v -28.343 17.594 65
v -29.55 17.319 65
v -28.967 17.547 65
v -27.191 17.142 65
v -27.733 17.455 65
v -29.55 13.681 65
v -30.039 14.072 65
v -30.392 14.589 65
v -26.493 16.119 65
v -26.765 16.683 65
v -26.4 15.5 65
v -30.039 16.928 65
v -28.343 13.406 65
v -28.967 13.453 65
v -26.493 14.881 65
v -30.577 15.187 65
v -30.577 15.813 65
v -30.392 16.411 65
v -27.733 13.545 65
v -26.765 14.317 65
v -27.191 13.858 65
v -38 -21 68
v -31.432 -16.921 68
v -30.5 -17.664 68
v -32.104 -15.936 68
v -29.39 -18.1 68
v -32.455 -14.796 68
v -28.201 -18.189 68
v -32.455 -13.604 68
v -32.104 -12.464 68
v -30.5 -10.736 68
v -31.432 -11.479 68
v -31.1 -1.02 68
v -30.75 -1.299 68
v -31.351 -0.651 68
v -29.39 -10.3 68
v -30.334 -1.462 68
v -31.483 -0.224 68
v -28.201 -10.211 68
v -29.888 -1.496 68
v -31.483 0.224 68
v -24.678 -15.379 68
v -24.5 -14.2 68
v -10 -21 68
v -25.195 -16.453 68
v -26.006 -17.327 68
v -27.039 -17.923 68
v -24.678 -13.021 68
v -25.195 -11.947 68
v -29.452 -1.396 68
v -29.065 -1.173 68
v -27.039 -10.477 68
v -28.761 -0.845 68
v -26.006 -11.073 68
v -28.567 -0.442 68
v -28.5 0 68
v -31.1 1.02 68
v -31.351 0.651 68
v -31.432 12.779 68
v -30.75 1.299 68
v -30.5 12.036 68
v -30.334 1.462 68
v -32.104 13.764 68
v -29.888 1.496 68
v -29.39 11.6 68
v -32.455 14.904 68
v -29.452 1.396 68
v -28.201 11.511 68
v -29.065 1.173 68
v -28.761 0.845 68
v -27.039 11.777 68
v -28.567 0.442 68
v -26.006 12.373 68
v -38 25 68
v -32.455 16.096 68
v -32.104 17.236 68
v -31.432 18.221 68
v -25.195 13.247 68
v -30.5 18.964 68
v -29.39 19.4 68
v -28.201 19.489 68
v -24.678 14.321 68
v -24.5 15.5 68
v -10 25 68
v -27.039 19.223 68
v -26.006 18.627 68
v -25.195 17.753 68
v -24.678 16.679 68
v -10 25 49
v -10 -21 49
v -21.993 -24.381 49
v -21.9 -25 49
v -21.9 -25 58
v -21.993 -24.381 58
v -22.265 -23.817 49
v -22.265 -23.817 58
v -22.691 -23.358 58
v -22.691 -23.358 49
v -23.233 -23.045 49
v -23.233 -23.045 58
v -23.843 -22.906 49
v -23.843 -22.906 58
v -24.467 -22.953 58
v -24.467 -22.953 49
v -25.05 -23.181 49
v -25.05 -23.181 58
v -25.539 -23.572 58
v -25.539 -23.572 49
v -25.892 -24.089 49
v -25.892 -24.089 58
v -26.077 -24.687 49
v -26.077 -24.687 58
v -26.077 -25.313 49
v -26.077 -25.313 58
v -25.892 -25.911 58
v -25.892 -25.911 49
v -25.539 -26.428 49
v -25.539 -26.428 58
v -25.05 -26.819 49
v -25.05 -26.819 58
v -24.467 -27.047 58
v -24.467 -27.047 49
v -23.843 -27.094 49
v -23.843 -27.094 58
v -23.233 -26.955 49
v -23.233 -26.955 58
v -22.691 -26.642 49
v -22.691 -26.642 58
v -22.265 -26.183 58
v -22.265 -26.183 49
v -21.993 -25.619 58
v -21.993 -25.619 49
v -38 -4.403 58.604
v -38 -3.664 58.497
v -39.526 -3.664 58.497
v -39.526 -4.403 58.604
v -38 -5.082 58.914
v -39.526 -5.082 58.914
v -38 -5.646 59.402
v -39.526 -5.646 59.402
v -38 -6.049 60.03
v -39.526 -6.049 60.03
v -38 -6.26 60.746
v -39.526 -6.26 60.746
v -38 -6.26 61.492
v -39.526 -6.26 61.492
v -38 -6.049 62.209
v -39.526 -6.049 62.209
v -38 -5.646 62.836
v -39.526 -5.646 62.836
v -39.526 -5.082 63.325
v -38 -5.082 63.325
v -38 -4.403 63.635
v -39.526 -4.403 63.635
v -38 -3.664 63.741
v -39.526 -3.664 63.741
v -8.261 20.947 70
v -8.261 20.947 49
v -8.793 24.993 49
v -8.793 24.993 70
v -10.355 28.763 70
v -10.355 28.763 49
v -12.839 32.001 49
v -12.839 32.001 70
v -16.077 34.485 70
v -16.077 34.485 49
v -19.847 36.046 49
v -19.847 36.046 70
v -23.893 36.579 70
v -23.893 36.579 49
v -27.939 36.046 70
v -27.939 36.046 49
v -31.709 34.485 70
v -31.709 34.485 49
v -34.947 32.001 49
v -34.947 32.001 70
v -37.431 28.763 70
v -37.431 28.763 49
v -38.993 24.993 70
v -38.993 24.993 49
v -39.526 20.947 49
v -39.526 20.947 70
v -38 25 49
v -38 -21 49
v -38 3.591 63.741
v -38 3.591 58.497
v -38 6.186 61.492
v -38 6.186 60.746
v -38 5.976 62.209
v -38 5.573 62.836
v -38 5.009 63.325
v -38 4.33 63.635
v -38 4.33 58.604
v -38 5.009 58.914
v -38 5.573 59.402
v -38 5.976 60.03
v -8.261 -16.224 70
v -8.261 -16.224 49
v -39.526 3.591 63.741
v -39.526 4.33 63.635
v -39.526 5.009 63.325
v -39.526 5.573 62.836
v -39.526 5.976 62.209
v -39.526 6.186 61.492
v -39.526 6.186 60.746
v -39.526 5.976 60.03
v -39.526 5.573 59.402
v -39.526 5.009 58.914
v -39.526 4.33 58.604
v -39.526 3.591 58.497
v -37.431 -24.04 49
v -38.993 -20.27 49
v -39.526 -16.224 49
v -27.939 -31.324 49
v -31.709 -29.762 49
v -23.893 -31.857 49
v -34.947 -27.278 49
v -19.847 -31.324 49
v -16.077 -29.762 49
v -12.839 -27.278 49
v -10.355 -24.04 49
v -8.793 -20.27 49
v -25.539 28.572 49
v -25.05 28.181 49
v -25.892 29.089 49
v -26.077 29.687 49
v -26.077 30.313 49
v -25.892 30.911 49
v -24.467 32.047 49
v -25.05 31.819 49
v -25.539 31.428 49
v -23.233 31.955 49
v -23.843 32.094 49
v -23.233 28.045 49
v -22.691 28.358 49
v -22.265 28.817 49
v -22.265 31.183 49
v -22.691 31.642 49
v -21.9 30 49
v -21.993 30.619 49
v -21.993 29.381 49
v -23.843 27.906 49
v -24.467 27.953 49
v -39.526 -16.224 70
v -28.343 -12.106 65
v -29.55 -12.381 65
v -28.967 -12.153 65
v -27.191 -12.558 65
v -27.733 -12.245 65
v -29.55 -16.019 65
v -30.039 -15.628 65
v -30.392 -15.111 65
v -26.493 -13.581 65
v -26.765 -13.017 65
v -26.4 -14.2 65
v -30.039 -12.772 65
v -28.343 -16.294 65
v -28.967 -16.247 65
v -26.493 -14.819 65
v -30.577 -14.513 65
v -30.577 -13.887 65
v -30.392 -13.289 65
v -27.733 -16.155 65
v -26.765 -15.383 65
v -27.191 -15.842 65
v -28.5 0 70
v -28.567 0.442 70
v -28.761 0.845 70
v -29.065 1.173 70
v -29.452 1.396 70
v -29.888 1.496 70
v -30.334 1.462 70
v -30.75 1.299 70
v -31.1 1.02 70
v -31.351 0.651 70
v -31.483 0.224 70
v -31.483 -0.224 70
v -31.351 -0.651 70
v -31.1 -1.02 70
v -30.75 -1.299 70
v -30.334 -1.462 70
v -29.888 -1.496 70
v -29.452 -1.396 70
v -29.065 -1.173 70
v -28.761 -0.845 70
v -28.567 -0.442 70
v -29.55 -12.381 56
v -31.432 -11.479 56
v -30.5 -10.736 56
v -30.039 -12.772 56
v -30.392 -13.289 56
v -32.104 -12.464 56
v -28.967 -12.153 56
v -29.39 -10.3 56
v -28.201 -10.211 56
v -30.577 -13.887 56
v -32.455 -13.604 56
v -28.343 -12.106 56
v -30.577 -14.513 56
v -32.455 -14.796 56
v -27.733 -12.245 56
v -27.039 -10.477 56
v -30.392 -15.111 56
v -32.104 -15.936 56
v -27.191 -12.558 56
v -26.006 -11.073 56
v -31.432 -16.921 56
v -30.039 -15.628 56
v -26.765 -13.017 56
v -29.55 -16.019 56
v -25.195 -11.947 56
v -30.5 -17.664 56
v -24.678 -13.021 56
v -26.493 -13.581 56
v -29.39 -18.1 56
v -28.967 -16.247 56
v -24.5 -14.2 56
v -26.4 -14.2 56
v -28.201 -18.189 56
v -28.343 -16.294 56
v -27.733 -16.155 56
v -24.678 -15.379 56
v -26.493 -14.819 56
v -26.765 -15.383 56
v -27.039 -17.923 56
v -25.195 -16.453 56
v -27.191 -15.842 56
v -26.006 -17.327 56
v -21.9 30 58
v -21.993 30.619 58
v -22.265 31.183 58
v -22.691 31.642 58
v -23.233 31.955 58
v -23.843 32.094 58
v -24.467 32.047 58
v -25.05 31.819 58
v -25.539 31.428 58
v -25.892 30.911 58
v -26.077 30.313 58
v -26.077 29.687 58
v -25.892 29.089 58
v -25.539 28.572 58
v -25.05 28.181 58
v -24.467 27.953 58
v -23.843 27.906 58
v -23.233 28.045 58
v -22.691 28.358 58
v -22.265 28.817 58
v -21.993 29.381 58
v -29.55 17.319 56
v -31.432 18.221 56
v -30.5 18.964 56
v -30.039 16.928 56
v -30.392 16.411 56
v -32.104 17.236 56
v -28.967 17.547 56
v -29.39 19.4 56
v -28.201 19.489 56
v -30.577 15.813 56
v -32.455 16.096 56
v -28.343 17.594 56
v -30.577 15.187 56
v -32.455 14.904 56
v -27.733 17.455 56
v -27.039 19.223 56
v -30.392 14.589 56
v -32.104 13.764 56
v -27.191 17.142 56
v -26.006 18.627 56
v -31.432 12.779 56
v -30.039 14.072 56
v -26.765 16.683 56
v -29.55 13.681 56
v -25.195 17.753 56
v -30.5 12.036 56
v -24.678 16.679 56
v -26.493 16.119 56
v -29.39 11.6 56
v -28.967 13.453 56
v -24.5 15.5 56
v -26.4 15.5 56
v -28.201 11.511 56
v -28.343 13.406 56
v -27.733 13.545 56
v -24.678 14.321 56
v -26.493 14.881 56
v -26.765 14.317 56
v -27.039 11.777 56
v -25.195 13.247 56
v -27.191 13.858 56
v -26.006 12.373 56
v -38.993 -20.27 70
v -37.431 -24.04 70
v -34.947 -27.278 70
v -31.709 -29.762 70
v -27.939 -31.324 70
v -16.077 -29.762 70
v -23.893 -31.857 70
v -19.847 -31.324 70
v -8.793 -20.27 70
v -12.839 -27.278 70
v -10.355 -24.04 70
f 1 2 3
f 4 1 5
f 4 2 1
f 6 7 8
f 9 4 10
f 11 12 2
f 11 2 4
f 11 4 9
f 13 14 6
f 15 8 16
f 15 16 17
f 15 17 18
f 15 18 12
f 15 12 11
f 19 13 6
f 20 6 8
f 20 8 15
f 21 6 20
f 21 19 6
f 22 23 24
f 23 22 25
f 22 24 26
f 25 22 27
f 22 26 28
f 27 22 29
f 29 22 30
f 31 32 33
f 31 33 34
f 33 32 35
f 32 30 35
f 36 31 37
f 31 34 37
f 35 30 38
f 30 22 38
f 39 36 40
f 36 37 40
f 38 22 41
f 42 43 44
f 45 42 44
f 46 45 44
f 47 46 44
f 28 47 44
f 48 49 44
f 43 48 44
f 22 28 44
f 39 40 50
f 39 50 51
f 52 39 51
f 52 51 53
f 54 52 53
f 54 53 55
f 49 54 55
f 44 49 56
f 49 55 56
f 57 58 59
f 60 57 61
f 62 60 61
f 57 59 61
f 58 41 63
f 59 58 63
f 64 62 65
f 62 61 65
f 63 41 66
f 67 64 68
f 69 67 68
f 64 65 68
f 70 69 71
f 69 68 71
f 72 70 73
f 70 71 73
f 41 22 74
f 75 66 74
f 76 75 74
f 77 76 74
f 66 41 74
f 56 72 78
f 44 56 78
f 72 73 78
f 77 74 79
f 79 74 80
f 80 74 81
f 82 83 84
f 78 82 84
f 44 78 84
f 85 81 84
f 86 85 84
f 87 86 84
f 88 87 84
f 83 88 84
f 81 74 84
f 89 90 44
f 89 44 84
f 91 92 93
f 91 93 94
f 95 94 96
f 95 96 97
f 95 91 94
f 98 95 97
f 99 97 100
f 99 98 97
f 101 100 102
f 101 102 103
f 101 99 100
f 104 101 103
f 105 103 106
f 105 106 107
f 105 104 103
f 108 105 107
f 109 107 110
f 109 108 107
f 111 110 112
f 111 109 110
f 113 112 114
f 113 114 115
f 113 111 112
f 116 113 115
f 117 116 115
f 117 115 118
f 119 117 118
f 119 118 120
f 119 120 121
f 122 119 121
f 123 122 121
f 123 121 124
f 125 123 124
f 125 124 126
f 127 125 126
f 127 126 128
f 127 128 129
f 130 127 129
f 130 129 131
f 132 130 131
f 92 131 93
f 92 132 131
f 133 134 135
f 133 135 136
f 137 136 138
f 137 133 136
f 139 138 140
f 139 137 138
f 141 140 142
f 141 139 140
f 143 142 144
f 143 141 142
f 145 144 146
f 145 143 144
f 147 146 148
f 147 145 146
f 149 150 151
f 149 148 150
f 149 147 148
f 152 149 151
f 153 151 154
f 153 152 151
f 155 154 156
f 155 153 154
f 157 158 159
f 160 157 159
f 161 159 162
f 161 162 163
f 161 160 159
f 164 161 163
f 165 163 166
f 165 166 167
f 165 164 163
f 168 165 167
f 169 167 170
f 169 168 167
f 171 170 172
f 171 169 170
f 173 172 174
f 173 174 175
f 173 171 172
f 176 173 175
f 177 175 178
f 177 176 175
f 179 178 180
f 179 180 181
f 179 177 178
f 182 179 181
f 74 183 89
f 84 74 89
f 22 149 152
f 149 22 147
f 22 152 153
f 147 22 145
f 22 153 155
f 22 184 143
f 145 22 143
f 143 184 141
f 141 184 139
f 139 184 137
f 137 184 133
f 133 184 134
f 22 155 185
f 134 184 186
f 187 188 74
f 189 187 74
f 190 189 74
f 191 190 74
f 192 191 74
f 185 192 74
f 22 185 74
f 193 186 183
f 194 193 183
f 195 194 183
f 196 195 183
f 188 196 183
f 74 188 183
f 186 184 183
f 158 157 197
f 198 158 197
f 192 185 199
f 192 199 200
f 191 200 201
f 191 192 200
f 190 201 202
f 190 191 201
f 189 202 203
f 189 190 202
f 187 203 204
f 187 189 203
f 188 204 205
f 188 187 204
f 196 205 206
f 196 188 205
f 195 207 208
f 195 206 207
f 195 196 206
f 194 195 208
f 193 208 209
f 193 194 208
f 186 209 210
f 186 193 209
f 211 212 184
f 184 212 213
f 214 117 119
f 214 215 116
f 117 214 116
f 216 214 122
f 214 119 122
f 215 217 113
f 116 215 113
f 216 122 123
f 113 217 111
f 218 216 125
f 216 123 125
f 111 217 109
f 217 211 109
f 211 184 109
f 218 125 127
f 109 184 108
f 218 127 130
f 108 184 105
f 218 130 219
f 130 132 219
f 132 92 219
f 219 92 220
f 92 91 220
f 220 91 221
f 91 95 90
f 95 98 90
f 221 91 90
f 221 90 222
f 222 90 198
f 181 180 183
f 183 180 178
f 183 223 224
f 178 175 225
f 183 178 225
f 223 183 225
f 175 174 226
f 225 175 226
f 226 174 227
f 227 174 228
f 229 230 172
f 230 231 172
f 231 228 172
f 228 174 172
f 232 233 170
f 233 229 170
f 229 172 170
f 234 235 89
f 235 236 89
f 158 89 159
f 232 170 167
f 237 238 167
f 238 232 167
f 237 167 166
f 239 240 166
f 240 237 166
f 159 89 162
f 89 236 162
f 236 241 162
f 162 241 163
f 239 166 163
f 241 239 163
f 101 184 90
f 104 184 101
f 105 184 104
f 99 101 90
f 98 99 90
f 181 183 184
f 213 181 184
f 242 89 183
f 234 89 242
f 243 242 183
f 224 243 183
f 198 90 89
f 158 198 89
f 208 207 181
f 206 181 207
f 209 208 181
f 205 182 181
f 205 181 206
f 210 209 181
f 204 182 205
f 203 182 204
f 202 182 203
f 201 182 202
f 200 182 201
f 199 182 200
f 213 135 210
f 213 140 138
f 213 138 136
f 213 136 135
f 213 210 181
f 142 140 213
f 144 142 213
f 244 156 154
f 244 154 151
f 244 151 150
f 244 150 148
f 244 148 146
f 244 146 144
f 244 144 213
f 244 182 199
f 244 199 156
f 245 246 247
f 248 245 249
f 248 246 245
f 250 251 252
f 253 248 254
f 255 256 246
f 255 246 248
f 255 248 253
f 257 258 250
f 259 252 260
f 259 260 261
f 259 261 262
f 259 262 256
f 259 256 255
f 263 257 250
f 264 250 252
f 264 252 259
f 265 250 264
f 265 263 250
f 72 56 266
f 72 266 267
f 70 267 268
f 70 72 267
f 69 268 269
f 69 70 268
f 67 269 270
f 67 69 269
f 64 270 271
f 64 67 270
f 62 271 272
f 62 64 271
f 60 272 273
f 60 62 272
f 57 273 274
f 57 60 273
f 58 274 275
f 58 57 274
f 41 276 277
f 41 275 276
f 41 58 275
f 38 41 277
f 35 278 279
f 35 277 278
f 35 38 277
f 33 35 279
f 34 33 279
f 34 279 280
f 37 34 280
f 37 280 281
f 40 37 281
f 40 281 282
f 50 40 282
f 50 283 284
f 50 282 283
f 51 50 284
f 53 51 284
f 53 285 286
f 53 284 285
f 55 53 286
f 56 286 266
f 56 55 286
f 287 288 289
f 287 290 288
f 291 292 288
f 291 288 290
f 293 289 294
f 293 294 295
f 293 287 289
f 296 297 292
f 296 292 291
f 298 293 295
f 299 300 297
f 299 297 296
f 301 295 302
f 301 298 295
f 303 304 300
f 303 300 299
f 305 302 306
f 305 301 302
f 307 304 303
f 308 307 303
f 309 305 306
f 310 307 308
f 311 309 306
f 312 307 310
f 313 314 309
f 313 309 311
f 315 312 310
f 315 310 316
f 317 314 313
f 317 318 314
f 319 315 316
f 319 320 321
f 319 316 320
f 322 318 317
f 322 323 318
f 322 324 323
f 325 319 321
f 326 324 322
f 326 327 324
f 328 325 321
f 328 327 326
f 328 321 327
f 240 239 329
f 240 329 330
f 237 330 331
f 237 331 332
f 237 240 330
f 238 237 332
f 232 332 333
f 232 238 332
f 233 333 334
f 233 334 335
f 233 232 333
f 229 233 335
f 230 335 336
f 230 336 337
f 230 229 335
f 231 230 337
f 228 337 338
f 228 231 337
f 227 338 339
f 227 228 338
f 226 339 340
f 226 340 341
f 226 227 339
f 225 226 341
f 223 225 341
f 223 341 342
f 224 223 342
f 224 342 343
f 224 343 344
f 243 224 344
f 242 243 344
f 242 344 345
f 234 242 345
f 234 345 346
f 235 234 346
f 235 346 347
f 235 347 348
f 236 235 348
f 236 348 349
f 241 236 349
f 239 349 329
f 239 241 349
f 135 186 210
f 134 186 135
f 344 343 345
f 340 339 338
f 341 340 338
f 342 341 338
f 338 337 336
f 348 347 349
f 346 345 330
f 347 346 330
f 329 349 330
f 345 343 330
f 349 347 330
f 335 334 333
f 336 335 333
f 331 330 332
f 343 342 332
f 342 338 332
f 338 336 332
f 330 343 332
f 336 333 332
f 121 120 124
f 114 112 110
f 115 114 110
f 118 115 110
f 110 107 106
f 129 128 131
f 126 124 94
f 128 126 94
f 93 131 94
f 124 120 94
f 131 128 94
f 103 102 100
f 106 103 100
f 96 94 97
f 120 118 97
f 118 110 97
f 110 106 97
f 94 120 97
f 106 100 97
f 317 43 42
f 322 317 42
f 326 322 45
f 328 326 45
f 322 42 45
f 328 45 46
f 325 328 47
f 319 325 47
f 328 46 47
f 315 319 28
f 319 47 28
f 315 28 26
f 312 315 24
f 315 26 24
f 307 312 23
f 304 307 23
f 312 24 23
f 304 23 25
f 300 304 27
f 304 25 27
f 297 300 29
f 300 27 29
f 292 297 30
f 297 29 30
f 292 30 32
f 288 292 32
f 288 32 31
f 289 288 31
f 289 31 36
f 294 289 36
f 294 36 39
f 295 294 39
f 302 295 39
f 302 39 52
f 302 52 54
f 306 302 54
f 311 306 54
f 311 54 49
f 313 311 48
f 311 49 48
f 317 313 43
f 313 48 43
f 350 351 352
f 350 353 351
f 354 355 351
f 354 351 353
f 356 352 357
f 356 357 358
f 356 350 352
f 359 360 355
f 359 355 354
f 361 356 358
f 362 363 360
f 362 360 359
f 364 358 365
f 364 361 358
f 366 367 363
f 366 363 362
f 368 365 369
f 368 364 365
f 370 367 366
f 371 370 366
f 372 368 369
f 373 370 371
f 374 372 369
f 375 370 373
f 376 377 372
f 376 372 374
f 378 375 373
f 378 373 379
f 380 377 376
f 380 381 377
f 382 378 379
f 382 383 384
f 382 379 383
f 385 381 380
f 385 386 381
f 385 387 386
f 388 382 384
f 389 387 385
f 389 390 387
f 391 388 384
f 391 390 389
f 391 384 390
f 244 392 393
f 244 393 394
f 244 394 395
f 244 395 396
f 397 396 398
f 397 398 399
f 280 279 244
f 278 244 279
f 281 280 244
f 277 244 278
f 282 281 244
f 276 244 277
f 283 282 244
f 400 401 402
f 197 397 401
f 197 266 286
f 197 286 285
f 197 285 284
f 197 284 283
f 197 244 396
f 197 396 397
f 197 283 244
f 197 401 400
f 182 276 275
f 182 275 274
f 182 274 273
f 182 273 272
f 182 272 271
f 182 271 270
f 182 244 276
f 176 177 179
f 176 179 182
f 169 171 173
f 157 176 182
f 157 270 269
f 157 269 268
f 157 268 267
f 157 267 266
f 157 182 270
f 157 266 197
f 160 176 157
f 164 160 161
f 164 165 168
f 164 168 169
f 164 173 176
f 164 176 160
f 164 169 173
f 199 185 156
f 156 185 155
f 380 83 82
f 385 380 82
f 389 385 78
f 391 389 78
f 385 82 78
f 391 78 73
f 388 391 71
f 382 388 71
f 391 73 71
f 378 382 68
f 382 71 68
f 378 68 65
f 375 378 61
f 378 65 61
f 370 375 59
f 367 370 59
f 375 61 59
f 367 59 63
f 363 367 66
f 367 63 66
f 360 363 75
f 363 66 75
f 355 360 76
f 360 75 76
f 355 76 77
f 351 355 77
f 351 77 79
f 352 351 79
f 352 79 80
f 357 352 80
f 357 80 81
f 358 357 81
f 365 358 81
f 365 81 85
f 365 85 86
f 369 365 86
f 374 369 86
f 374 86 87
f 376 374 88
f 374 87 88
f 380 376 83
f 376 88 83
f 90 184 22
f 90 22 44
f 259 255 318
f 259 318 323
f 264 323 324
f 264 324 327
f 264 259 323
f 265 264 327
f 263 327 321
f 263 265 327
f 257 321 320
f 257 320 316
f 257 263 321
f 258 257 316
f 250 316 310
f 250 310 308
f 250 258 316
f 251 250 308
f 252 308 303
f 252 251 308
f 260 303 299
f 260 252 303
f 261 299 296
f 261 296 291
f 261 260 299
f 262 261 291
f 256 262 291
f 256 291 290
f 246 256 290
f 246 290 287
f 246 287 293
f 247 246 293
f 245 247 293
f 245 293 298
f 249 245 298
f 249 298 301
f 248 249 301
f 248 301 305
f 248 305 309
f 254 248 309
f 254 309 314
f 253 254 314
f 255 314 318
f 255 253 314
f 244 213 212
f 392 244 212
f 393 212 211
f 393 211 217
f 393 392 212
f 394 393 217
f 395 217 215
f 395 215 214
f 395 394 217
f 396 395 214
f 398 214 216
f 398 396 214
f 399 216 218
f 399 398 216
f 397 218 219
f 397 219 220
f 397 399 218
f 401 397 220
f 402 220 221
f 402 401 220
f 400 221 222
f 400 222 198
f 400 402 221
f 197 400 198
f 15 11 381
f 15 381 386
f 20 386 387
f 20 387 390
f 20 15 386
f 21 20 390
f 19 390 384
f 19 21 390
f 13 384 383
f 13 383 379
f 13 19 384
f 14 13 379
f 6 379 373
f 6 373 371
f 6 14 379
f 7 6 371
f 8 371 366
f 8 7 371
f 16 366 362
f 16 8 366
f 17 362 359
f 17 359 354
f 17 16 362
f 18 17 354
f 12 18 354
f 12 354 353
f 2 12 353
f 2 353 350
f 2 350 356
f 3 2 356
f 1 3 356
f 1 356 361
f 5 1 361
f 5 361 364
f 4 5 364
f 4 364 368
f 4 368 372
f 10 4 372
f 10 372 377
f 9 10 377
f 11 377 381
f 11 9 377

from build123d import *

# Parameters (mm, degrees)
CYLINDER025_R              = 1.5
CYLINDER025_DEPTH          = 4
CYLINDER020_R              = 2.1
CYLINDER020_DEPTH          = 9
CYLINDER019_R              = 4
CYLINDER019_DEPTH          = 12
CUT015_PLACEMENT_ANGLE     = 180
CYLINDER022_R              = 2.1
CYLINDER022_DEPTH          = 9
EXTRUDE005_DEPTH           = 3
EXTRUDE005_PLACEMENT_ANGLE = 270
CYLINDER021_R              = 2.1
CYLINDER021_DEPTH          = 9
BOX_W                      = 28
BOX_H                      = 46
BOX_DEPTH                  = 19
EXTRUDE009_DEPTH           = 21


with BuildPart() as ledhold001:
    # Cylinder025 → Cylinder025 (new body)
    with BuildSketch(Plane(origin=(-30, 0, 67), x_dir=(1, 0, 0), z_dir=(0, 0, 1))):
        Circle(CYLINDER025_R)
    extrude(amount=CYLINDER025_DEPTH)


with BuildPart() as insert006:
    # Cylinder020 → Cylinder020 (new body)
    with BuildSketch(Plane(origin=(5.5, -0.5, 1), x_dir=(1, 0, 0), z_dir=(0, 0, 1))):
        Circle(CYLINDER020_R)
    extrude(amount=CYLINDER020_DEPTH)


with BuildPart() as cpusupport001:
    # Cylinder019 → Cylinder019 (new body)
    with BuildSketch(Plane(origin=(5.5, -0.5, -2), x_dir=(1, 0, 0), z_dir=(0, 0, 1))):
        Circle(CYLINDER019_R)
    extrude(amount=CYLINDER019_DEPTH)

    # Cut015: cut insert006
    add(insert006.part, mode=Mode.SUBTRACT)


with BuildPart() as cpusupport001_1:
    # Cut015 placement: moved
    add(cpusupport001.part.moved(Location((-34, -14.7, 66))).rotate(Axis((-34, -14.7, 66), (1, 0, 0)), CUT015_PLACEMENT_ANGLE))


with BuildPart() as cpusupport002:
    # Clone006 base: copy of cpuSupport001
    add(cpusupport001_1.part)


with BuildPart() as cpusupport002_1:
    # Clone006 placement: moved
    add(cpusupport002.part.moved(Location((0, 29.7, 0))))


with BuildPart() as insert008:
    # Cylinder022 → Cylinder022 (new body)
    with BuildSketch(Plane(origin=(-24, -25, 49), x_dir=(1, 0, 0), z_dir=(0, 0, 1))):
        Circle(CYLINDER022_R)
    extrude(amount=CYLINDER022_DEPTH)


with BuildPart() as usbextrude001:
    # Sketch005 → Extrude005 (new body)
    with BuildSketch(Plane(origin=(-2, -1, -5), x_dir=(1, 0, 0), z_dir=(0, -1, 0))):
        with BuildLine():
            ThreePointArc((16.408865, 14.741362), (13.786843, 12.11934), (16.408865, 9.497318))
            Line((16.408865, 9.497318), (23.664412, 9.497318))
            ThreePointArc((23.664412, 9.497318), (26.286434, 12.11934), (23.664412, 14.741362))
            Line((16.408865, 14.741362), (23.664412, 14.741362))
        make_face()
    extrude(amount=EXTRUDE005_DEPTH)


with BuildPart() as usbextrude001_1:
    # Extrude005 placement: moved
    add(usbextrude001.part.moved(Location((-36, 18, 54))).rotate(Axis((-36, 18, 54), (0, 0, 1)), EXTRUDE005_PLACEMENT_ANGLE))


with BuildPart() as fusion001:
    # Cylinder021 → Cylinder021 (new body)
    with BuildSketch(Plane(origin=(-24, 30, 49), x_dir=(1, 0, 0), z_dir=(0, 0, 1))):
        Circle(CYLINDER021_R)
    extrude(amount=CYLINDER021_DEPTH)

    # Fusion001: union insert008, usbExtrude001
    add(insert008.part)
    add(usbextrude001_1.part)


with BuildPart() as inner001:
    # Box → Box (new body)
    with BuildSketch(Plane(origin=(-38, -21, 49), x_dir=(1, 0, 0), z_dir=(0, 0, 1))):
        with Locations((14, 23)):
            Rectangle(BOX_W, BOX_H)
    extrude(amount=BOX_DEPTH)


with BuildPart() as fullcase002:
    # Sketch006 (on Face6 of Box) → Extrude009 (new body)
    with BuildSketch(Plane(origin=(-38, -21, 70), x_dir=(1, 0, 0), z_dir=(0, 0, 1))):
        with BuildLine():
            ThreePointArc((29.739196, 41.946692), (14.106739, 57.579149), (-1.525718, 41.946692))
            Line((-1.525718, 41.946692), (-1.525718, 4.775835))
            ThreePointArc((-1.525718, 4.775835), (14.106739, -10.856622), (29.739196, 4.775835))
            Line((29.739196, 41.946692), (29.739196, 4.775835))
        make_face()
    extrude(amount=-EXTRUDE009_DEPTH)

    # Cut016: cut inner001
    add(inner001.part, mode=Mode.SUBTRACT)

    # Cut017: cut Fusion001
    add(fusion001.part, mode=Mode.SUBTRACT)

    # Fusion002: union cpuSupport002, cpuSupport001
    add(cpusupport002_1.part)
    add(cpusupport001_1.part)

    # Cut019: cut ledHold001
    add(ledhold001.part, mode=Mode.SUBTRACT)


solid = fullcase002.part
